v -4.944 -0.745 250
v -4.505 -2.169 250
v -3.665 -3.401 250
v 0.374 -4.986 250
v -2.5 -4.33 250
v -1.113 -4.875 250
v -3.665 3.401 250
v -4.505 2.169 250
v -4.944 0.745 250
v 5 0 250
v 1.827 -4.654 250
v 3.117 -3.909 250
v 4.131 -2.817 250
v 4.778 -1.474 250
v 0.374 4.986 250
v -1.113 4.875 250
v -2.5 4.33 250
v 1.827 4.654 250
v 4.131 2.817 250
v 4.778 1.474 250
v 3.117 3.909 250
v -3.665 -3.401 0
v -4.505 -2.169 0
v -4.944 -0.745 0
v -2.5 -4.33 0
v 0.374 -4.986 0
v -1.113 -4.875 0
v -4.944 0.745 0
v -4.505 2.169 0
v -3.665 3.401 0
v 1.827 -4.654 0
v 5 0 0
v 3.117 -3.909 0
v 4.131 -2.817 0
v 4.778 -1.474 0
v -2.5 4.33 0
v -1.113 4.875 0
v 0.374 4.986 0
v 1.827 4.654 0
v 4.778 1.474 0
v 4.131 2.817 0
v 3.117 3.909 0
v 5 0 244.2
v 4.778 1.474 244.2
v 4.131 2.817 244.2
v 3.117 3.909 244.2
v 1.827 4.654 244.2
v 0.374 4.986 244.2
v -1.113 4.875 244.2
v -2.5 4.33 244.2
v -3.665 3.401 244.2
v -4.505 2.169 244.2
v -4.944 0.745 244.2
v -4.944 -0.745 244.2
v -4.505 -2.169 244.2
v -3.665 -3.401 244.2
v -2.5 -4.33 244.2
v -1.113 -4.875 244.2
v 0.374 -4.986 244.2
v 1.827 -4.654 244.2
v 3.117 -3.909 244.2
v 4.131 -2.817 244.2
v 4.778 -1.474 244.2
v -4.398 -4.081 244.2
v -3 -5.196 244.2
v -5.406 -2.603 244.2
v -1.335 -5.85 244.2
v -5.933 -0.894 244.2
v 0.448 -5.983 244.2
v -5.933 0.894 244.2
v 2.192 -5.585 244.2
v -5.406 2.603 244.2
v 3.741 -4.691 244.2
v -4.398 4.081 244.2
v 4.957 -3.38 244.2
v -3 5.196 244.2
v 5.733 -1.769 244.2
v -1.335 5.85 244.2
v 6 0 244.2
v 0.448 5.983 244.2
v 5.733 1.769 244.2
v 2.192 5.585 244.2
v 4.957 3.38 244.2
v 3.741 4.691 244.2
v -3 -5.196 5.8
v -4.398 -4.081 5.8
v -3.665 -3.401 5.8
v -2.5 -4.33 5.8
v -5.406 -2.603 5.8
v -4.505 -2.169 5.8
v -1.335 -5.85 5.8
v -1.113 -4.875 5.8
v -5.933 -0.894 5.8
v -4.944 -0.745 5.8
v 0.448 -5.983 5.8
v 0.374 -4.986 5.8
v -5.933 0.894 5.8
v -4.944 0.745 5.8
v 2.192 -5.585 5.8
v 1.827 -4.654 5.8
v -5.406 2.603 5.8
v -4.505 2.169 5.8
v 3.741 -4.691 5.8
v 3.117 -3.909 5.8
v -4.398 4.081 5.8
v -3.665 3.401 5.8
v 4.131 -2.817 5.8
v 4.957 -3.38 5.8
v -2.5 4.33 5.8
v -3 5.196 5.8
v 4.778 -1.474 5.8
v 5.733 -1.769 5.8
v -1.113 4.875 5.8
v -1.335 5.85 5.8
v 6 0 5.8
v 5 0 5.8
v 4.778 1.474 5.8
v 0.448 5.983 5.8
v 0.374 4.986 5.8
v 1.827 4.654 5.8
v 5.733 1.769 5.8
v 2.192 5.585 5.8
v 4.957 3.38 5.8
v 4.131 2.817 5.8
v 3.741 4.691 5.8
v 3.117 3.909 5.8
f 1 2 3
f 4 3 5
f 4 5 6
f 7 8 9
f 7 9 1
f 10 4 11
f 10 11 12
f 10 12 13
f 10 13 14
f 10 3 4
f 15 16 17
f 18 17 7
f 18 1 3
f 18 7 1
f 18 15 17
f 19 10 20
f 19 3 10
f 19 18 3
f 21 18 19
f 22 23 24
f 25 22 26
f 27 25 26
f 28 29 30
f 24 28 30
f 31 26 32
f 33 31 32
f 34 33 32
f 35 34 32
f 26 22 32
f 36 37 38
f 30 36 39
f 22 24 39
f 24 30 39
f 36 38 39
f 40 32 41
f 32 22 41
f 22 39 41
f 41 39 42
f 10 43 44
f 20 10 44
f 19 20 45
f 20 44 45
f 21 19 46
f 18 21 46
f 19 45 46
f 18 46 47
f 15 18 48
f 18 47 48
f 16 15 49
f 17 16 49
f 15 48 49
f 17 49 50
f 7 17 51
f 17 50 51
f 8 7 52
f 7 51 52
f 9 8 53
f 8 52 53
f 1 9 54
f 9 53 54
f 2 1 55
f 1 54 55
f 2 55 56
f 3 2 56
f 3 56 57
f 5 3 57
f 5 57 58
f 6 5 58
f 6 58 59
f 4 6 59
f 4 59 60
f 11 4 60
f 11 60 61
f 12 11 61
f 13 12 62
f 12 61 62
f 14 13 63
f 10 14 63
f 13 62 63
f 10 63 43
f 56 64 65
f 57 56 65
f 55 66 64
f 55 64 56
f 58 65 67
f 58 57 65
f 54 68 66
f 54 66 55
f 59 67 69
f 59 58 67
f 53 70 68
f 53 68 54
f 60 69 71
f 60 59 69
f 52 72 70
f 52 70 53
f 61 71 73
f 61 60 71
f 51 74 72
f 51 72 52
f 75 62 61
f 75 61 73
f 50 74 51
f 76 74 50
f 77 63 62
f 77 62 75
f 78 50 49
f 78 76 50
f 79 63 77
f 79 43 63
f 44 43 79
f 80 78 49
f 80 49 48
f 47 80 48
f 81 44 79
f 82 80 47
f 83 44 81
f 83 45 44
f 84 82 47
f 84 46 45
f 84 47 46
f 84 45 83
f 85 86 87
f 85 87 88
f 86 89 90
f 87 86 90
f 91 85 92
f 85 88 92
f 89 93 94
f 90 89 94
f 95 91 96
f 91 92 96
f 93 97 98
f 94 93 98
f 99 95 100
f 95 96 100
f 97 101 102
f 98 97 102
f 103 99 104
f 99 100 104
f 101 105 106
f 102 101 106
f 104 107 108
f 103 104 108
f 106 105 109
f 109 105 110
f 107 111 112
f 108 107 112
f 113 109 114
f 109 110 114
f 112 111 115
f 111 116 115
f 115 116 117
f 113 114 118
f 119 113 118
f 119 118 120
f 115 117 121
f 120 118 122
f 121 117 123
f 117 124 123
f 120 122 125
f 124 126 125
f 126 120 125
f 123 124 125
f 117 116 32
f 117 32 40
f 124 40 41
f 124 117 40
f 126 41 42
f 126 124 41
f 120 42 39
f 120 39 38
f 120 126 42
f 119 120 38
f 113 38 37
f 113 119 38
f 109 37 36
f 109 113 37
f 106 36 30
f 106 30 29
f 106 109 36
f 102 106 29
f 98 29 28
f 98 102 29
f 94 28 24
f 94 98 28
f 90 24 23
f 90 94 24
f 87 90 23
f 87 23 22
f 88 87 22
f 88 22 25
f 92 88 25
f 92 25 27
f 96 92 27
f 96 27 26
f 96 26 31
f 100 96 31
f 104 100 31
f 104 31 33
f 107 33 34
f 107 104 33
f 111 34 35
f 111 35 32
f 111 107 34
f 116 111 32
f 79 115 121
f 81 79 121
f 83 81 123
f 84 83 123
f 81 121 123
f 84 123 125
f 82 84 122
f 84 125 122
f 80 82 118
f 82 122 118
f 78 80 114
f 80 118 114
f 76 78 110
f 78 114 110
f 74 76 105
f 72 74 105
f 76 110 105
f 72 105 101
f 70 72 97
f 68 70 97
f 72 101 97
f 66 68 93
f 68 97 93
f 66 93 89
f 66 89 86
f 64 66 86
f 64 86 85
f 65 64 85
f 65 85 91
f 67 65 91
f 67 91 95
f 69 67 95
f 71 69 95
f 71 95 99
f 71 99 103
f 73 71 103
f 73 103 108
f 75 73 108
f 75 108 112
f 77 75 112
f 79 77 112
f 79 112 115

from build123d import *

# Parameters (mm, degrees)
SKETCH_1_R          = 6
EXTRUDE_1_DEPTH     = 250
CUT_EXTRUDE_START   = -5.8
SKETCH_2_R          = 6
SKETCH_2_R_2        = 5
CUT_EXTRUDE_1_DEPTH = 5.8


with BuildPart() as part:
    # ｽｹｯﾁ1 → ﾎﾞｽ - 押し出し1 (new body)
    with BuildSketch(Plane.XY):
        Circle(SKETCH_1_R)
    extrude(amount=EXTRUDE_1_DEPTH)

    # ｽｹｯﾁ2 → ｶｯﾄ - 押し出し1 (cut)
    with BuildSketch(Plane.XY.offset(250).offset(CUT_EXTRUDE_START)):
        Circle(SKETCH_2_R)
        Circle(SKETCH_2_R_2, mode=Mode.SUBTRACT)
    cut_extrude_1 = extrude(amount=CUT_EXTRUDE_1_DEPTH, mode=Mode.SUBTRACT)

    # ﾐﾗｰ1: ｶｯﾄ - 押し出し1 across plane
    add(cut_extrude_1.mirror(Plane.XY.offset(125)), mode=Mode.SUBTRACT)


solid = part.part
